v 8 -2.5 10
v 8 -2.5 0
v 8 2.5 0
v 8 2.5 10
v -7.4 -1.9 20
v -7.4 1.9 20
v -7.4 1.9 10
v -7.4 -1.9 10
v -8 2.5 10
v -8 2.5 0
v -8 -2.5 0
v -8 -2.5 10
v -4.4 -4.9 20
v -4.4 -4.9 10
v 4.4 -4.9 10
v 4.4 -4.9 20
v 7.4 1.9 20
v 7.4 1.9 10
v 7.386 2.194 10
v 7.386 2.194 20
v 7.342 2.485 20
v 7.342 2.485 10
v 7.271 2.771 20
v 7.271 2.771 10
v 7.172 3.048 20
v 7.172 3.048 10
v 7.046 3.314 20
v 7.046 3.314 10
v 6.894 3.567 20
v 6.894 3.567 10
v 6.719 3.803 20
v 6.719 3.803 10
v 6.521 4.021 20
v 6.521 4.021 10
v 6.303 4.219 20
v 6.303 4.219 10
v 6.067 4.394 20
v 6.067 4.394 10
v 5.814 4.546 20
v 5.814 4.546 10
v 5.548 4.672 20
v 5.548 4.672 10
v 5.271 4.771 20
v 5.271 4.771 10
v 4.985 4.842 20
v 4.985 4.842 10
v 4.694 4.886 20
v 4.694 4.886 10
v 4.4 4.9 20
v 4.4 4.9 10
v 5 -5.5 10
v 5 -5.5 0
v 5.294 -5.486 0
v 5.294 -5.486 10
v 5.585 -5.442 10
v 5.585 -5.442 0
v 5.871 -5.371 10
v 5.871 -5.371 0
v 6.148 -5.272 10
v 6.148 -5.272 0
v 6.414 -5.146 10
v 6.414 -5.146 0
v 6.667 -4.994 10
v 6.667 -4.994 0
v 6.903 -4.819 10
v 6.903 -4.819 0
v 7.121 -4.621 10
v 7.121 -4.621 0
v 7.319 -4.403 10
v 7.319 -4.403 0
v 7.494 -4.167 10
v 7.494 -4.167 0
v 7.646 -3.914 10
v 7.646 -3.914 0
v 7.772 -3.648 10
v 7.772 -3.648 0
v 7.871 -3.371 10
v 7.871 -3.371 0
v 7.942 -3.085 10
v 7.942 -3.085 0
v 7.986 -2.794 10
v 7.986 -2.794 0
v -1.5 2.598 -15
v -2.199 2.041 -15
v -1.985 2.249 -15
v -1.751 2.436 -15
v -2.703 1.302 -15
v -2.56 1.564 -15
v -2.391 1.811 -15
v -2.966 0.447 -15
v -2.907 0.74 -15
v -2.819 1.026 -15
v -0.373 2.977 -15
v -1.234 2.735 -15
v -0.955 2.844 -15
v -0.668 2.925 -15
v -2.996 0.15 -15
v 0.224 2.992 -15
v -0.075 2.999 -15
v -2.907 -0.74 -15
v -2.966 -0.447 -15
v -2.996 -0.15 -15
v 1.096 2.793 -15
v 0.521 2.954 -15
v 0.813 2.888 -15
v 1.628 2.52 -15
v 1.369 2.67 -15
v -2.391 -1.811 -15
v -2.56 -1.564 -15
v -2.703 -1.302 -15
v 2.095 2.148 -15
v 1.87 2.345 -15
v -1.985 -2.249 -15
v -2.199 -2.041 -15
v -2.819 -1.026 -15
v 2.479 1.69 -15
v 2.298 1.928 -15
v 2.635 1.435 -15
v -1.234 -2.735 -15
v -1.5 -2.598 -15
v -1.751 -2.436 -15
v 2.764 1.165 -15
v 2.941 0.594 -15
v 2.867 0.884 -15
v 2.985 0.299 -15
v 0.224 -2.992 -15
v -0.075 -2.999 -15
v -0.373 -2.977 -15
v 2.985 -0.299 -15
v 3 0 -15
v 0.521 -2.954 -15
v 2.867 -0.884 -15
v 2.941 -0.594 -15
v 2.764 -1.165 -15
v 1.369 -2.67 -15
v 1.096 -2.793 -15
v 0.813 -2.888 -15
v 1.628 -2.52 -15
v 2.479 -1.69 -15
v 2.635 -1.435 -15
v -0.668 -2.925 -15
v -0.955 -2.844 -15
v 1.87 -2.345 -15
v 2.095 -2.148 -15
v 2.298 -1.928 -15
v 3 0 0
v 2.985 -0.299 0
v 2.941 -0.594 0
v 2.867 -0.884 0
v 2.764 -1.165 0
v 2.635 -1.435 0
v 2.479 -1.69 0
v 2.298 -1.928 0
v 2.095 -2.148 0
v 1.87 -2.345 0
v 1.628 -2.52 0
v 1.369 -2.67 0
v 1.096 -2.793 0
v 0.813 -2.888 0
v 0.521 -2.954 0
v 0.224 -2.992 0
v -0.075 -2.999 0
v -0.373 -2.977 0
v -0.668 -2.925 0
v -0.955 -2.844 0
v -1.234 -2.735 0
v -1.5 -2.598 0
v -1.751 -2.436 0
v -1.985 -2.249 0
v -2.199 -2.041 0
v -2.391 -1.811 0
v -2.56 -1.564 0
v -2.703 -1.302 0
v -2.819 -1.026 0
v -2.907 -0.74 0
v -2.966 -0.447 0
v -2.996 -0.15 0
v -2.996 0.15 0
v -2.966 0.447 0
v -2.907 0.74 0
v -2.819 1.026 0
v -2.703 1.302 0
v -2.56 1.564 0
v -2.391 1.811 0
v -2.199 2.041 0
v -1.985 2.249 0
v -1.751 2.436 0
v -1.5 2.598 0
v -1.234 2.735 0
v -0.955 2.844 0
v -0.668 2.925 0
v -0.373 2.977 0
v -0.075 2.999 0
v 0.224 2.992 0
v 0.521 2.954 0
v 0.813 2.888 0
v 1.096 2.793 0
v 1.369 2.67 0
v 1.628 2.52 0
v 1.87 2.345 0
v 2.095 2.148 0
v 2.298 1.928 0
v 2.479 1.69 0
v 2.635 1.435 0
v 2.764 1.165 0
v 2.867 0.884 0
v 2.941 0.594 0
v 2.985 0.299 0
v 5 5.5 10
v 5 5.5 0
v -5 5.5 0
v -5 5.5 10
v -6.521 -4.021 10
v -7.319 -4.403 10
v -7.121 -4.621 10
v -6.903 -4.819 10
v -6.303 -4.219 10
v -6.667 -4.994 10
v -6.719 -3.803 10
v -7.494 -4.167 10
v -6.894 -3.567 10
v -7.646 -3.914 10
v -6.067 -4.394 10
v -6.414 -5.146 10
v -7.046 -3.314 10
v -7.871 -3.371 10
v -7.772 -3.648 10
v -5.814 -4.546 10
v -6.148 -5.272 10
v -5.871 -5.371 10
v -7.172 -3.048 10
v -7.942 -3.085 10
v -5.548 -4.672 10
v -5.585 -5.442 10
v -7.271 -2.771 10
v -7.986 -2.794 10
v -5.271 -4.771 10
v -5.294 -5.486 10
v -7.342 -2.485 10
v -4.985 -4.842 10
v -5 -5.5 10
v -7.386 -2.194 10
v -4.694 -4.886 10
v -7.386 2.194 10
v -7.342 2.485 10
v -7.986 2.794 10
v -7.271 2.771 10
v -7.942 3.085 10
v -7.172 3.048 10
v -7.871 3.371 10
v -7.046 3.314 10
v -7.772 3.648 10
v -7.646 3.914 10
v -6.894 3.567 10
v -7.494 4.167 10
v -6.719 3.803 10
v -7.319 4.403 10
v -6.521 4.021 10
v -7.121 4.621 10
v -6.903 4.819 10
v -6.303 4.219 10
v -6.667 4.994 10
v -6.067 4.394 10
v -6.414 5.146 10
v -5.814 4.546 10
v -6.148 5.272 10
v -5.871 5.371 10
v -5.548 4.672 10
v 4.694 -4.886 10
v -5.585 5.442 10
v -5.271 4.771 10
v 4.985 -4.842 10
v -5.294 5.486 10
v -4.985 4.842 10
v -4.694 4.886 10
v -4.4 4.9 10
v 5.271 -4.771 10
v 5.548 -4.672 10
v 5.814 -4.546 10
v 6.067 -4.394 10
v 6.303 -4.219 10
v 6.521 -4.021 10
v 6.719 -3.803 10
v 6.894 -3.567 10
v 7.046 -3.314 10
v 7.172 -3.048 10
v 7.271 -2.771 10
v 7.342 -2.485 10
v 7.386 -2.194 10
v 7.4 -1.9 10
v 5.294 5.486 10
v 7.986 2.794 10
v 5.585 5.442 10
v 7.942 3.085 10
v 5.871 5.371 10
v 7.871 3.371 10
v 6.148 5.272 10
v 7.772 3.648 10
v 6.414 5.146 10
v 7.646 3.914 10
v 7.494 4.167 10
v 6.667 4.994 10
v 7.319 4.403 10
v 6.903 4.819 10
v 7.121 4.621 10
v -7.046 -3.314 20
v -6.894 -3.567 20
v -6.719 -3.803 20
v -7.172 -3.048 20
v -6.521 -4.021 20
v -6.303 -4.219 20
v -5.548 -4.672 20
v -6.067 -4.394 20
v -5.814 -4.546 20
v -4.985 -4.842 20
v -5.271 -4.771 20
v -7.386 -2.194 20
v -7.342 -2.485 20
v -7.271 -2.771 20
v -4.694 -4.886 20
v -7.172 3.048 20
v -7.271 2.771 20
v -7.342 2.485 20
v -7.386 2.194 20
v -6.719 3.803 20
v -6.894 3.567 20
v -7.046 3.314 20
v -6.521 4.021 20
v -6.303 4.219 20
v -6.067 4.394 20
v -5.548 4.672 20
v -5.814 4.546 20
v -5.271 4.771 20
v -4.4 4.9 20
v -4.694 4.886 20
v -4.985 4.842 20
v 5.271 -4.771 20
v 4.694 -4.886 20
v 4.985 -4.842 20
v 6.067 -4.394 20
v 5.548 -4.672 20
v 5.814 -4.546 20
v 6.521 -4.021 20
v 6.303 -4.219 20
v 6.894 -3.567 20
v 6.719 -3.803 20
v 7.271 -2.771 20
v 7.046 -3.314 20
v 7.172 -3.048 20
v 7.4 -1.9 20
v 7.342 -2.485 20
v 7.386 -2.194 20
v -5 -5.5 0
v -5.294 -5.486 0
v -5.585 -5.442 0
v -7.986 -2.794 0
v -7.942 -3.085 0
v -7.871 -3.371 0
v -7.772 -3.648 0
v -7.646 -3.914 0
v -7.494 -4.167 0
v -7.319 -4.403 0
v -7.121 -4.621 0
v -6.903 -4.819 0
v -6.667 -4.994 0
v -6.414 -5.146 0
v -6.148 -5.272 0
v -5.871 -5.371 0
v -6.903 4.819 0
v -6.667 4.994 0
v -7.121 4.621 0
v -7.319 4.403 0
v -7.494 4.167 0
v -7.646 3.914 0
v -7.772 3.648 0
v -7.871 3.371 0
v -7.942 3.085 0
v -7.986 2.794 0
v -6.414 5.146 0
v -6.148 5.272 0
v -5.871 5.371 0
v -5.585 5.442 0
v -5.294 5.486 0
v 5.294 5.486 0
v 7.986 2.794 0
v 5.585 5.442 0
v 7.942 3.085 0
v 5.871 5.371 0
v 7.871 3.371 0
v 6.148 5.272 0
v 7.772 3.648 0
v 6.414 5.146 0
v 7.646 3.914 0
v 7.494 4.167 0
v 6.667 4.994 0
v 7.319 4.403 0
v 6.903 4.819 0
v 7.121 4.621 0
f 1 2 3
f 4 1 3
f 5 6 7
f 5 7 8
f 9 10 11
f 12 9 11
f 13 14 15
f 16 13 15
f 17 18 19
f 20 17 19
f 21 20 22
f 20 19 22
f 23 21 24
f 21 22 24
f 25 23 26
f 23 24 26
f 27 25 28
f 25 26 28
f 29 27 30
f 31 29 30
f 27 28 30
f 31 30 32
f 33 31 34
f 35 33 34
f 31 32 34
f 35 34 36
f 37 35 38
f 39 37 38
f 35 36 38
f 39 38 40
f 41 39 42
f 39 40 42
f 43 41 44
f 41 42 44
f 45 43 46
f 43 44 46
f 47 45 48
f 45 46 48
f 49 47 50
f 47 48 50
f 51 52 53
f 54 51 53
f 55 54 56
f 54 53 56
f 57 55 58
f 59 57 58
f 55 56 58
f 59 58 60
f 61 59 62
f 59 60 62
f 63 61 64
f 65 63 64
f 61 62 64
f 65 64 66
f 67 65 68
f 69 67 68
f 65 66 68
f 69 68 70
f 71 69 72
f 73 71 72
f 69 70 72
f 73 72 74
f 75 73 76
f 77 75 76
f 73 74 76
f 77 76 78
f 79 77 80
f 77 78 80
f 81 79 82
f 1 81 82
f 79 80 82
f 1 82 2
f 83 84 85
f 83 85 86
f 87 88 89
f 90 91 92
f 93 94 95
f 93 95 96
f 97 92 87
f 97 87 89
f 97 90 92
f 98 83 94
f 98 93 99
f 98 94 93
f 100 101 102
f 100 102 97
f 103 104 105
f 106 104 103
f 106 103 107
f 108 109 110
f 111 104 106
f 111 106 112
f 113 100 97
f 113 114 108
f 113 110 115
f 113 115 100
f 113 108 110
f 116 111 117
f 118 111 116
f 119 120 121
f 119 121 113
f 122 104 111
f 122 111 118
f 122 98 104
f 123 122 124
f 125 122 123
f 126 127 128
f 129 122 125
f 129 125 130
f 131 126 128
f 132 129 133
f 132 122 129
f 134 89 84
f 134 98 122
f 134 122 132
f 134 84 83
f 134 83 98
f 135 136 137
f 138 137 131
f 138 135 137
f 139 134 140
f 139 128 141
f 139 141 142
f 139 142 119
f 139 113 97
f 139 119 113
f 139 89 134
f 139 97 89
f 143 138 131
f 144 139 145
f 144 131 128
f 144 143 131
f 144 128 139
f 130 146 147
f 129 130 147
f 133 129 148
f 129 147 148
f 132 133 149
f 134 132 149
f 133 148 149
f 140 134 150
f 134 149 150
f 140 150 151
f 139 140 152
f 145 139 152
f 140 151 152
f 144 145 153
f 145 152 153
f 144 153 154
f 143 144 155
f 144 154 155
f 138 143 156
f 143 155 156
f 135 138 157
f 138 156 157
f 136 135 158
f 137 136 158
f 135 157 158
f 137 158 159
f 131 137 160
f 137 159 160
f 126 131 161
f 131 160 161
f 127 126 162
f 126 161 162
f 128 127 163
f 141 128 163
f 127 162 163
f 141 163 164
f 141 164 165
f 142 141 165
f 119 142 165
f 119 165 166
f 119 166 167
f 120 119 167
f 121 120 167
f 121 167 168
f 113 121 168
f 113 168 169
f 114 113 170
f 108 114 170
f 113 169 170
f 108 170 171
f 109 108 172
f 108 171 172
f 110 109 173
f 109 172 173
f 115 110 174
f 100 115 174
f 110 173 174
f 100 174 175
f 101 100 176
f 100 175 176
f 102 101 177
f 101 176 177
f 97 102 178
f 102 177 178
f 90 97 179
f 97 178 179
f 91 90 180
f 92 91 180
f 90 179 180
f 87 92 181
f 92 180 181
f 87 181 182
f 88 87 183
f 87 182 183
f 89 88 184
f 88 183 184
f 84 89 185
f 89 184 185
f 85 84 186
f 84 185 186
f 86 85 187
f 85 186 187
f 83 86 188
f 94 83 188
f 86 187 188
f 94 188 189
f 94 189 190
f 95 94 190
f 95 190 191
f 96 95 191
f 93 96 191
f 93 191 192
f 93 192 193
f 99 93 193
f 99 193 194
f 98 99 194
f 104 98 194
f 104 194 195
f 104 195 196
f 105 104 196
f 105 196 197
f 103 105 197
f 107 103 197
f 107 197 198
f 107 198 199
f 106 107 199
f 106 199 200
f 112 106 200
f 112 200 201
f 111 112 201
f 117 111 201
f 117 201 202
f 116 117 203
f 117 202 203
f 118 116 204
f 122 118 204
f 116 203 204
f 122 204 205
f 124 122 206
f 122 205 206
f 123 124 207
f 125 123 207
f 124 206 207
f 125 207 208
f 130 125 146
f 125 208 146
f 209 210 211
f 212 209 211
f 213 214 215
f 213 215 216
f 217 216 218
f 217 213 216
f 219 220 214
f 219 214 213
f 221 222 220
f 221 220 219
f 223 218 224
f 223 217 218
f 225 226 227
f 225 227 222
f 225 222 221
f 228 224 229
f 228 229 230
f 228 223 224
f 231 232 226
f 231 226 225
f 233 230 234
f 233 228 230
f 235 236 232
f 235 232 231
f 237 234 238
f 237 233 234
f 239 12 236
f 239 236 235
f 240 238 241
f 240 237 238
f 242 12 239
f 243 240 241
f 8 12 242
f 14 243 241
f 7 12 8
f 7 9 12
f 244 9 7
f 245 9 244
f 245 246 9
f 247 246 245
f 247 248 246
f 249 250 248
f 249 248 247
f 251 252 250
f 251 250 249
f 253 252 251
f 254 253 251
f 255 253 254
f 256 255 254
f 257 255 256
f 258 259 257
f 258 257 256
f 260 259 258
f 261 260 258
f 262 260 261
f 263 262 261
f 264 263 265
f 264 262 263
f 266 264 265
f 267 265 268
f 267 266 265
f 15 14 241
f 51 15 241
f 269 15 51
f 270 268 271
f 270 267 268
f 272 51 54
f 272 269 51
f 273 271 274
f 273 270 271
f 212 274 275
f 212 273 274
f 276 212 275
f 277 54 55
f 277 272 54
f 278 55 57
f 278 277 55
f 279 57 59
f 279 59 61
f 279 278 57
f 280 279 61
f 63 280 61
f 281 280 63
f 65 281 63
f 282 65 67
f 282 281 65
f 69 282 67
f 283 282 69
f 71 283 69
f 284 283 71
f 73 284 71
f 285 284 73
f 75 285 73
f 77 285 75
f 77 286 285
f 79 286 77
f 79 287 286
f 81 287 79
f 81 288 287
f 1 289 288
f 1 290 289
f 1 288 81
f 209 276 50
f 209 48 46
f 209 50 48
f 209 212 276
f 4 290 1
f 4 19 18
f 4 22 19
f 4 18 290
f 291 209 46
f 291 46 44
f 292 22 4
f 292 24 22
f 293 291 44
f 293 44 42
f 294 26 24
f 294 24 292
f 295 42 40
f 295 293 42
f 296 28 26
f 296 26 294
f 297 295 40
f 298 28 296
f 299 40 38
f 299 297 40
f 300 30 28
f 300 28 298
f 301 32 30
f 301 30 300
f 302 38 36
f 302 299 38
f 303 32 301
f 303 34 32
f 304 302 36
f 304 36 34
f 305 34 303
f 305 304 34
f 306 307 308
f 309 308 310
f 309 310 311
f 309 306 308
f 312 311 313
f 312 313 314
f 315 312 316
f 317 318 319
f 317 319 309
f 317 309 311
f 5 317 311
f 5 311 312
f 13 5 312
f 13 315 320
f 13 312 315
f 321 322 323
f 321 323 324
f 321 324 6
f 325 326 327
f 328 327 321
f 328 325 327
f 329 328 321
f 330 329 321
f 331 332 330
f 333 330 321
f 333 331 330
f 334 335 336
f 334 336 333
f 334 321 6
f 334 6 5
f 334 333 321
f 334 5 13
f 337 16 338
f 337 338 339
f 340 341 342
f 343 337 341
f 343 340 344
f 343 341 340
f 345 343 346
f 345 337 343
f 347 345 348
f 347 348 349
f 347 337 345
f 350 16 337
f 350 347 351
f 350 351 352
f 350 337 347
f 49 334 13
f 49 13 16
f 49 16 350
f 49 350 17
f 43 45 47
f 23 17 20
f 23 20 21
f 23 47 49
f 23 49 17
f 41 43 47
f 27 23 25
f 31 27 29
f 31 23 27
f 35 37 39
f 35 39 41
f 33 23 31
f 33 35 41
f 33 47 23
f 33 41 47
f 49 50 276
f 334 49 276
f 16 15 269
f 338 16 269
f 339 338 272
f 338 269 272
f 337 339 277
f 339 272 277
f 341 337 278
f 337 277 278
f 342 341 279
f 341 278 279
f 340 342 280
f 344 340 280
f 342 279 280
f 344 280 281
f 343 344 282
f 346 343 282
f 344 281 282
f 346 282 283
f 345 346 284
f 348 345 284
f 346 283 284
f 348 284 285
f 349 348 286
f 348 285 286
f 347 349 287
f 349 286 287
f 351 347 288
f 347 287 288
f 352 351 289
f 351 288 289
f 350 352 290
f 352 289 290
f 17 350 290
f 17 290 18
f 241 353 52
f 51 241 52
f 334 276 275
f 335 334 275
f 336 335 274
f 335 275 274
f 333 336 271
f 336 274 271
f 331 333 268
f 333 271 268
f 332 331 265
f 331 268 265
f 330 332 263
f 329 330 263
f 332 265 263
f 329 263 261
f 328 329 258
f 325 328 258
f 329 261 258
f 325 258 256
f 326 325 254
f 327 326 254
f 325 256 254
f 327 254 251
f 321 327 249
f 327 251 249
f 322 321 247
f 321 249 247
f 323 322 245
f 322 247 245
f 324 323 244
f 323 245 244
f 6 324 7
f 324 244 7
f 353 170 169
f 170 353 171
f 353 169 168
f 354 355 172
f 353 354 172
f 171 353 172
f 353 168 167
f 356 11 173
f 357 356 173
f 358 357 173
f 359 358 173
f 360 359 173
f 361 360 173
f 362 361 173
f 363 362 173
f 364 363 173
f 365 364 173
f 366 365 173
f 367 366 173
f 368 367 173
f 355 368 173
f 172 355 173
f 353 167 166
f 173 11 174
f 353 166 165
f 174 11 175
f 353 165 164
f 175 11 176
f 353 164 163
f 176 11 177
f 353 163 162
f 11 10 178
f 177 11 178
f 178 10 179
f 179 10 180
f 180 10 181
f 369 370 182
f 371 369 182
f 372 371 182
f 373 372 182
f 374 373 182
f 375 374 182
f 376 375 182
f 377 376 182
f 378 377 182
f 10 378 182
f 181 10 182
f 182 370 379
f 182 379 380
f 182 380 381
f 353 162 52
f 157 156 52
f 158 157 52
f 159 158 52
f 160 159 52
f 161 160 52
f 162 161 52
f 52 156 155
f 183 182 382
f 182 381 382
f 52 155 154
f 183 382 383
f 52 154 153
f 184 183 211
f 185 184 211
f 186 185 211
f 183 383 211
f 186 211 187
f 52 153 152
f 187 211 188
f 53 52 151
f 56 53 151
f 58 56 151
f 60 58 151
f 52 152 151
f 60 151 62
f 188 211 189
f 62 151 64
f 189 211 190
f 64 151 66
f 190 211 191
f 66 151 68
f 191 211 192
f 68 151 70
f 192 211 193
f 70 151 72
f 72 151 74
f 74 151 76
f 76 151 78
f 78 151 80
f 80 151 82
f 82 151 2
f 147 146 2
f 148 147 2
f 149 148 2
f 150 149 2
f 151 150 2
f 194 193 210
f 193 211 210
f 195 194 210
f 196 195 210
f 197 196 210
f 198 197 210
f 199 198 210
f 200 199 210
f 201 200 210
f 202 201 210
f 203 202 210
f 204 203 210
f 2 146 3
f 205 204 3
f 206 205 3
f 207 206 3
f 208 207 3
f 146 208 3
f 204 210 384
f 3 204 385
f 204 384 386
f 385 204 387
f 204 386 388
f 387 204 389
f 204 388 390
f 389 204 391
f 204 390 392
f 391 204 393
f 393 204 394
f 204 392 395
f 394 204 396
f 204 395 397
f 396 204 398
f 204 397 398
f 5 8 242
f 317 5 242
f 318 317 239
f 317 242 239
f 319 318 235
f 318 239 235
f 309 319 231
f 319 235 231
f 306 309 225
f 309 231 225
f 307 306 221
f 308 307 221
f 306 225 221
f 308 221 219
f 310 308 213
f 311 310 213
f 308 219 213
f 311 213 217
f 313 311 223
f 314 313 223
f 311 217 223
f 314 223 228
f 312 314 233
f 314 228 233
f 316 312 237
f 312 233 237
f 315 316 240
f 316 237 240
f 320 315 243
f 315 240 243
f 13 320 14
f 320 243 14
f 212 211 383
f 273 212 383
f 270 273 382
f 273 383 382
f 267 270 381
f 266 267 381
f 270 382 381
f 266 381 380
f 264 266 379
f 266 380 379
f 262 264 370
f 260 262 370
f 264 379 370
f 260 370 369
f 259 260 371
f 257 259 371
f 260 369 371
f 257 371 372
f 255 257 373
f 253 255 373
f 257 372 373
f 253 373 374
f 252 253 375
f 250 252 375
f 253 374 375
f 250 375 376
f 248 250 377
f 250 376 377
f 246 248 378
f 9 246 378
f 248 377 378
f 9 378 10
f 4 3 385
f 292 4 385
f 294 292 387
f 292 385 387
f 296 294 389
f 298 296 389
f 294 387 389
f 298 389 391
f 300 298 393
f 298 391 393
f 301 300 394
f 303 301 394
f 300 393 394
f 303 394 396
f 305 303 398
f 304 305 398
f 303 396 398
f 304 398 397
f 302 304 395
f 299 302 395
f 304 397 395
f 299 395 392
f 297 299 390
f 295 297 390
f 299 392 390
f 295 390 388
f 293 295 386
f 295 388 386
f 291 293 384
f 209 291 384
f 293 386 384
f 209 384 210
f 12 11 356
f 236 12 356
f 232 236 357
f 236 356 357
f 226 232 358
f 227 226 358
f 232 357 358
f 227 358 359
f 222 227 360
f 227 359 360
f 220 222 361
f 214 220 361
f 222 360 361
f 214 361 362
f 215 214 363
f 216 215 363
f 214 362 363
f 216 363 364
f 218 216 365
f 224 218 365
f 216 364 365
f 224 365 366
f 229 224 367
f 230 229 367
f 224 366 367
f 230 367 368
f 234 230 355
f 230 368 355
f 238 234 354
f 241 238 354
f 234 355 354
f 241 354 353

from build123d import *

# Parameters (mm, degrees)
F1_DEPTH = 10
F3_DEPTH = 10
F4_R     = 3
F5_DEPTH = 15


with BuildPart() as f1:
    # F0 (on Top) → F1 (new body)
    with BuildSketch(Plane.XY):
        with BuildLine():
            Line((5, 5.5), (-5, 5.5))
            ThreePointArc((-5, 5.5), (-7.12132, 4.62132), (-8, 2.5))
            Line((-8, 2.5), (-8, -2.5))
            ThreePointArc((-8, -2.5), (-7.12132, -4.62132), (-5, -5.5))
            Line((-5, -5.5), (5, -5.5))
            ThreePointArc((5, -5.5), (7.12132, -4.62132), (8, -2.5))
            Line((8, -2.5), (8, 2.5))
            ThreePointArc((8, 2.5), (7.12132, 4.62132), (5, 5.5))
        make_face()
    extrude(amount=F1_DEPTH)

    # F2 (on face) → F3 (join)
    with BuildSketch(Plane.XY.offset(10)):
        with BuildLine():
            Line((4.4, 4.9), (-4.4, 4.9))
            ThreePointArc((-4.4, 4.9), (-6.52132, 4.02132), (-7.4, 1.9))
            Line((-7.4, 1.9), (-7.4, -1.9))
            ThreePointArc((-7.4, -1.9), (-6.52132, -4.02132), (-4.4, -4.9))
            Line((-4.4, -4.9), (4.4, -4.9))
            ThreePointArc((4.4, -4.9), (6.52132, -4.02132), (7.4, -1.9))
            Line((7.4, -1.9), (7.4, 1.9))
            ThreePointArc((7.4, 1.9), (6.52132, 4.02132), (4.4, 4.9))
        make_face()
    extrude(amount=F3_DEPTH)

    # F4 (on face) → F5 (join)
    with BuildSketch(Plane(origin=(0, 0, 0), x_dir=(1, 0, 0), z_dir=(0, 0, -1))):
        Circle(F4_R)
    extrude(amount=F5_DEPTH)


solid = f1.part
